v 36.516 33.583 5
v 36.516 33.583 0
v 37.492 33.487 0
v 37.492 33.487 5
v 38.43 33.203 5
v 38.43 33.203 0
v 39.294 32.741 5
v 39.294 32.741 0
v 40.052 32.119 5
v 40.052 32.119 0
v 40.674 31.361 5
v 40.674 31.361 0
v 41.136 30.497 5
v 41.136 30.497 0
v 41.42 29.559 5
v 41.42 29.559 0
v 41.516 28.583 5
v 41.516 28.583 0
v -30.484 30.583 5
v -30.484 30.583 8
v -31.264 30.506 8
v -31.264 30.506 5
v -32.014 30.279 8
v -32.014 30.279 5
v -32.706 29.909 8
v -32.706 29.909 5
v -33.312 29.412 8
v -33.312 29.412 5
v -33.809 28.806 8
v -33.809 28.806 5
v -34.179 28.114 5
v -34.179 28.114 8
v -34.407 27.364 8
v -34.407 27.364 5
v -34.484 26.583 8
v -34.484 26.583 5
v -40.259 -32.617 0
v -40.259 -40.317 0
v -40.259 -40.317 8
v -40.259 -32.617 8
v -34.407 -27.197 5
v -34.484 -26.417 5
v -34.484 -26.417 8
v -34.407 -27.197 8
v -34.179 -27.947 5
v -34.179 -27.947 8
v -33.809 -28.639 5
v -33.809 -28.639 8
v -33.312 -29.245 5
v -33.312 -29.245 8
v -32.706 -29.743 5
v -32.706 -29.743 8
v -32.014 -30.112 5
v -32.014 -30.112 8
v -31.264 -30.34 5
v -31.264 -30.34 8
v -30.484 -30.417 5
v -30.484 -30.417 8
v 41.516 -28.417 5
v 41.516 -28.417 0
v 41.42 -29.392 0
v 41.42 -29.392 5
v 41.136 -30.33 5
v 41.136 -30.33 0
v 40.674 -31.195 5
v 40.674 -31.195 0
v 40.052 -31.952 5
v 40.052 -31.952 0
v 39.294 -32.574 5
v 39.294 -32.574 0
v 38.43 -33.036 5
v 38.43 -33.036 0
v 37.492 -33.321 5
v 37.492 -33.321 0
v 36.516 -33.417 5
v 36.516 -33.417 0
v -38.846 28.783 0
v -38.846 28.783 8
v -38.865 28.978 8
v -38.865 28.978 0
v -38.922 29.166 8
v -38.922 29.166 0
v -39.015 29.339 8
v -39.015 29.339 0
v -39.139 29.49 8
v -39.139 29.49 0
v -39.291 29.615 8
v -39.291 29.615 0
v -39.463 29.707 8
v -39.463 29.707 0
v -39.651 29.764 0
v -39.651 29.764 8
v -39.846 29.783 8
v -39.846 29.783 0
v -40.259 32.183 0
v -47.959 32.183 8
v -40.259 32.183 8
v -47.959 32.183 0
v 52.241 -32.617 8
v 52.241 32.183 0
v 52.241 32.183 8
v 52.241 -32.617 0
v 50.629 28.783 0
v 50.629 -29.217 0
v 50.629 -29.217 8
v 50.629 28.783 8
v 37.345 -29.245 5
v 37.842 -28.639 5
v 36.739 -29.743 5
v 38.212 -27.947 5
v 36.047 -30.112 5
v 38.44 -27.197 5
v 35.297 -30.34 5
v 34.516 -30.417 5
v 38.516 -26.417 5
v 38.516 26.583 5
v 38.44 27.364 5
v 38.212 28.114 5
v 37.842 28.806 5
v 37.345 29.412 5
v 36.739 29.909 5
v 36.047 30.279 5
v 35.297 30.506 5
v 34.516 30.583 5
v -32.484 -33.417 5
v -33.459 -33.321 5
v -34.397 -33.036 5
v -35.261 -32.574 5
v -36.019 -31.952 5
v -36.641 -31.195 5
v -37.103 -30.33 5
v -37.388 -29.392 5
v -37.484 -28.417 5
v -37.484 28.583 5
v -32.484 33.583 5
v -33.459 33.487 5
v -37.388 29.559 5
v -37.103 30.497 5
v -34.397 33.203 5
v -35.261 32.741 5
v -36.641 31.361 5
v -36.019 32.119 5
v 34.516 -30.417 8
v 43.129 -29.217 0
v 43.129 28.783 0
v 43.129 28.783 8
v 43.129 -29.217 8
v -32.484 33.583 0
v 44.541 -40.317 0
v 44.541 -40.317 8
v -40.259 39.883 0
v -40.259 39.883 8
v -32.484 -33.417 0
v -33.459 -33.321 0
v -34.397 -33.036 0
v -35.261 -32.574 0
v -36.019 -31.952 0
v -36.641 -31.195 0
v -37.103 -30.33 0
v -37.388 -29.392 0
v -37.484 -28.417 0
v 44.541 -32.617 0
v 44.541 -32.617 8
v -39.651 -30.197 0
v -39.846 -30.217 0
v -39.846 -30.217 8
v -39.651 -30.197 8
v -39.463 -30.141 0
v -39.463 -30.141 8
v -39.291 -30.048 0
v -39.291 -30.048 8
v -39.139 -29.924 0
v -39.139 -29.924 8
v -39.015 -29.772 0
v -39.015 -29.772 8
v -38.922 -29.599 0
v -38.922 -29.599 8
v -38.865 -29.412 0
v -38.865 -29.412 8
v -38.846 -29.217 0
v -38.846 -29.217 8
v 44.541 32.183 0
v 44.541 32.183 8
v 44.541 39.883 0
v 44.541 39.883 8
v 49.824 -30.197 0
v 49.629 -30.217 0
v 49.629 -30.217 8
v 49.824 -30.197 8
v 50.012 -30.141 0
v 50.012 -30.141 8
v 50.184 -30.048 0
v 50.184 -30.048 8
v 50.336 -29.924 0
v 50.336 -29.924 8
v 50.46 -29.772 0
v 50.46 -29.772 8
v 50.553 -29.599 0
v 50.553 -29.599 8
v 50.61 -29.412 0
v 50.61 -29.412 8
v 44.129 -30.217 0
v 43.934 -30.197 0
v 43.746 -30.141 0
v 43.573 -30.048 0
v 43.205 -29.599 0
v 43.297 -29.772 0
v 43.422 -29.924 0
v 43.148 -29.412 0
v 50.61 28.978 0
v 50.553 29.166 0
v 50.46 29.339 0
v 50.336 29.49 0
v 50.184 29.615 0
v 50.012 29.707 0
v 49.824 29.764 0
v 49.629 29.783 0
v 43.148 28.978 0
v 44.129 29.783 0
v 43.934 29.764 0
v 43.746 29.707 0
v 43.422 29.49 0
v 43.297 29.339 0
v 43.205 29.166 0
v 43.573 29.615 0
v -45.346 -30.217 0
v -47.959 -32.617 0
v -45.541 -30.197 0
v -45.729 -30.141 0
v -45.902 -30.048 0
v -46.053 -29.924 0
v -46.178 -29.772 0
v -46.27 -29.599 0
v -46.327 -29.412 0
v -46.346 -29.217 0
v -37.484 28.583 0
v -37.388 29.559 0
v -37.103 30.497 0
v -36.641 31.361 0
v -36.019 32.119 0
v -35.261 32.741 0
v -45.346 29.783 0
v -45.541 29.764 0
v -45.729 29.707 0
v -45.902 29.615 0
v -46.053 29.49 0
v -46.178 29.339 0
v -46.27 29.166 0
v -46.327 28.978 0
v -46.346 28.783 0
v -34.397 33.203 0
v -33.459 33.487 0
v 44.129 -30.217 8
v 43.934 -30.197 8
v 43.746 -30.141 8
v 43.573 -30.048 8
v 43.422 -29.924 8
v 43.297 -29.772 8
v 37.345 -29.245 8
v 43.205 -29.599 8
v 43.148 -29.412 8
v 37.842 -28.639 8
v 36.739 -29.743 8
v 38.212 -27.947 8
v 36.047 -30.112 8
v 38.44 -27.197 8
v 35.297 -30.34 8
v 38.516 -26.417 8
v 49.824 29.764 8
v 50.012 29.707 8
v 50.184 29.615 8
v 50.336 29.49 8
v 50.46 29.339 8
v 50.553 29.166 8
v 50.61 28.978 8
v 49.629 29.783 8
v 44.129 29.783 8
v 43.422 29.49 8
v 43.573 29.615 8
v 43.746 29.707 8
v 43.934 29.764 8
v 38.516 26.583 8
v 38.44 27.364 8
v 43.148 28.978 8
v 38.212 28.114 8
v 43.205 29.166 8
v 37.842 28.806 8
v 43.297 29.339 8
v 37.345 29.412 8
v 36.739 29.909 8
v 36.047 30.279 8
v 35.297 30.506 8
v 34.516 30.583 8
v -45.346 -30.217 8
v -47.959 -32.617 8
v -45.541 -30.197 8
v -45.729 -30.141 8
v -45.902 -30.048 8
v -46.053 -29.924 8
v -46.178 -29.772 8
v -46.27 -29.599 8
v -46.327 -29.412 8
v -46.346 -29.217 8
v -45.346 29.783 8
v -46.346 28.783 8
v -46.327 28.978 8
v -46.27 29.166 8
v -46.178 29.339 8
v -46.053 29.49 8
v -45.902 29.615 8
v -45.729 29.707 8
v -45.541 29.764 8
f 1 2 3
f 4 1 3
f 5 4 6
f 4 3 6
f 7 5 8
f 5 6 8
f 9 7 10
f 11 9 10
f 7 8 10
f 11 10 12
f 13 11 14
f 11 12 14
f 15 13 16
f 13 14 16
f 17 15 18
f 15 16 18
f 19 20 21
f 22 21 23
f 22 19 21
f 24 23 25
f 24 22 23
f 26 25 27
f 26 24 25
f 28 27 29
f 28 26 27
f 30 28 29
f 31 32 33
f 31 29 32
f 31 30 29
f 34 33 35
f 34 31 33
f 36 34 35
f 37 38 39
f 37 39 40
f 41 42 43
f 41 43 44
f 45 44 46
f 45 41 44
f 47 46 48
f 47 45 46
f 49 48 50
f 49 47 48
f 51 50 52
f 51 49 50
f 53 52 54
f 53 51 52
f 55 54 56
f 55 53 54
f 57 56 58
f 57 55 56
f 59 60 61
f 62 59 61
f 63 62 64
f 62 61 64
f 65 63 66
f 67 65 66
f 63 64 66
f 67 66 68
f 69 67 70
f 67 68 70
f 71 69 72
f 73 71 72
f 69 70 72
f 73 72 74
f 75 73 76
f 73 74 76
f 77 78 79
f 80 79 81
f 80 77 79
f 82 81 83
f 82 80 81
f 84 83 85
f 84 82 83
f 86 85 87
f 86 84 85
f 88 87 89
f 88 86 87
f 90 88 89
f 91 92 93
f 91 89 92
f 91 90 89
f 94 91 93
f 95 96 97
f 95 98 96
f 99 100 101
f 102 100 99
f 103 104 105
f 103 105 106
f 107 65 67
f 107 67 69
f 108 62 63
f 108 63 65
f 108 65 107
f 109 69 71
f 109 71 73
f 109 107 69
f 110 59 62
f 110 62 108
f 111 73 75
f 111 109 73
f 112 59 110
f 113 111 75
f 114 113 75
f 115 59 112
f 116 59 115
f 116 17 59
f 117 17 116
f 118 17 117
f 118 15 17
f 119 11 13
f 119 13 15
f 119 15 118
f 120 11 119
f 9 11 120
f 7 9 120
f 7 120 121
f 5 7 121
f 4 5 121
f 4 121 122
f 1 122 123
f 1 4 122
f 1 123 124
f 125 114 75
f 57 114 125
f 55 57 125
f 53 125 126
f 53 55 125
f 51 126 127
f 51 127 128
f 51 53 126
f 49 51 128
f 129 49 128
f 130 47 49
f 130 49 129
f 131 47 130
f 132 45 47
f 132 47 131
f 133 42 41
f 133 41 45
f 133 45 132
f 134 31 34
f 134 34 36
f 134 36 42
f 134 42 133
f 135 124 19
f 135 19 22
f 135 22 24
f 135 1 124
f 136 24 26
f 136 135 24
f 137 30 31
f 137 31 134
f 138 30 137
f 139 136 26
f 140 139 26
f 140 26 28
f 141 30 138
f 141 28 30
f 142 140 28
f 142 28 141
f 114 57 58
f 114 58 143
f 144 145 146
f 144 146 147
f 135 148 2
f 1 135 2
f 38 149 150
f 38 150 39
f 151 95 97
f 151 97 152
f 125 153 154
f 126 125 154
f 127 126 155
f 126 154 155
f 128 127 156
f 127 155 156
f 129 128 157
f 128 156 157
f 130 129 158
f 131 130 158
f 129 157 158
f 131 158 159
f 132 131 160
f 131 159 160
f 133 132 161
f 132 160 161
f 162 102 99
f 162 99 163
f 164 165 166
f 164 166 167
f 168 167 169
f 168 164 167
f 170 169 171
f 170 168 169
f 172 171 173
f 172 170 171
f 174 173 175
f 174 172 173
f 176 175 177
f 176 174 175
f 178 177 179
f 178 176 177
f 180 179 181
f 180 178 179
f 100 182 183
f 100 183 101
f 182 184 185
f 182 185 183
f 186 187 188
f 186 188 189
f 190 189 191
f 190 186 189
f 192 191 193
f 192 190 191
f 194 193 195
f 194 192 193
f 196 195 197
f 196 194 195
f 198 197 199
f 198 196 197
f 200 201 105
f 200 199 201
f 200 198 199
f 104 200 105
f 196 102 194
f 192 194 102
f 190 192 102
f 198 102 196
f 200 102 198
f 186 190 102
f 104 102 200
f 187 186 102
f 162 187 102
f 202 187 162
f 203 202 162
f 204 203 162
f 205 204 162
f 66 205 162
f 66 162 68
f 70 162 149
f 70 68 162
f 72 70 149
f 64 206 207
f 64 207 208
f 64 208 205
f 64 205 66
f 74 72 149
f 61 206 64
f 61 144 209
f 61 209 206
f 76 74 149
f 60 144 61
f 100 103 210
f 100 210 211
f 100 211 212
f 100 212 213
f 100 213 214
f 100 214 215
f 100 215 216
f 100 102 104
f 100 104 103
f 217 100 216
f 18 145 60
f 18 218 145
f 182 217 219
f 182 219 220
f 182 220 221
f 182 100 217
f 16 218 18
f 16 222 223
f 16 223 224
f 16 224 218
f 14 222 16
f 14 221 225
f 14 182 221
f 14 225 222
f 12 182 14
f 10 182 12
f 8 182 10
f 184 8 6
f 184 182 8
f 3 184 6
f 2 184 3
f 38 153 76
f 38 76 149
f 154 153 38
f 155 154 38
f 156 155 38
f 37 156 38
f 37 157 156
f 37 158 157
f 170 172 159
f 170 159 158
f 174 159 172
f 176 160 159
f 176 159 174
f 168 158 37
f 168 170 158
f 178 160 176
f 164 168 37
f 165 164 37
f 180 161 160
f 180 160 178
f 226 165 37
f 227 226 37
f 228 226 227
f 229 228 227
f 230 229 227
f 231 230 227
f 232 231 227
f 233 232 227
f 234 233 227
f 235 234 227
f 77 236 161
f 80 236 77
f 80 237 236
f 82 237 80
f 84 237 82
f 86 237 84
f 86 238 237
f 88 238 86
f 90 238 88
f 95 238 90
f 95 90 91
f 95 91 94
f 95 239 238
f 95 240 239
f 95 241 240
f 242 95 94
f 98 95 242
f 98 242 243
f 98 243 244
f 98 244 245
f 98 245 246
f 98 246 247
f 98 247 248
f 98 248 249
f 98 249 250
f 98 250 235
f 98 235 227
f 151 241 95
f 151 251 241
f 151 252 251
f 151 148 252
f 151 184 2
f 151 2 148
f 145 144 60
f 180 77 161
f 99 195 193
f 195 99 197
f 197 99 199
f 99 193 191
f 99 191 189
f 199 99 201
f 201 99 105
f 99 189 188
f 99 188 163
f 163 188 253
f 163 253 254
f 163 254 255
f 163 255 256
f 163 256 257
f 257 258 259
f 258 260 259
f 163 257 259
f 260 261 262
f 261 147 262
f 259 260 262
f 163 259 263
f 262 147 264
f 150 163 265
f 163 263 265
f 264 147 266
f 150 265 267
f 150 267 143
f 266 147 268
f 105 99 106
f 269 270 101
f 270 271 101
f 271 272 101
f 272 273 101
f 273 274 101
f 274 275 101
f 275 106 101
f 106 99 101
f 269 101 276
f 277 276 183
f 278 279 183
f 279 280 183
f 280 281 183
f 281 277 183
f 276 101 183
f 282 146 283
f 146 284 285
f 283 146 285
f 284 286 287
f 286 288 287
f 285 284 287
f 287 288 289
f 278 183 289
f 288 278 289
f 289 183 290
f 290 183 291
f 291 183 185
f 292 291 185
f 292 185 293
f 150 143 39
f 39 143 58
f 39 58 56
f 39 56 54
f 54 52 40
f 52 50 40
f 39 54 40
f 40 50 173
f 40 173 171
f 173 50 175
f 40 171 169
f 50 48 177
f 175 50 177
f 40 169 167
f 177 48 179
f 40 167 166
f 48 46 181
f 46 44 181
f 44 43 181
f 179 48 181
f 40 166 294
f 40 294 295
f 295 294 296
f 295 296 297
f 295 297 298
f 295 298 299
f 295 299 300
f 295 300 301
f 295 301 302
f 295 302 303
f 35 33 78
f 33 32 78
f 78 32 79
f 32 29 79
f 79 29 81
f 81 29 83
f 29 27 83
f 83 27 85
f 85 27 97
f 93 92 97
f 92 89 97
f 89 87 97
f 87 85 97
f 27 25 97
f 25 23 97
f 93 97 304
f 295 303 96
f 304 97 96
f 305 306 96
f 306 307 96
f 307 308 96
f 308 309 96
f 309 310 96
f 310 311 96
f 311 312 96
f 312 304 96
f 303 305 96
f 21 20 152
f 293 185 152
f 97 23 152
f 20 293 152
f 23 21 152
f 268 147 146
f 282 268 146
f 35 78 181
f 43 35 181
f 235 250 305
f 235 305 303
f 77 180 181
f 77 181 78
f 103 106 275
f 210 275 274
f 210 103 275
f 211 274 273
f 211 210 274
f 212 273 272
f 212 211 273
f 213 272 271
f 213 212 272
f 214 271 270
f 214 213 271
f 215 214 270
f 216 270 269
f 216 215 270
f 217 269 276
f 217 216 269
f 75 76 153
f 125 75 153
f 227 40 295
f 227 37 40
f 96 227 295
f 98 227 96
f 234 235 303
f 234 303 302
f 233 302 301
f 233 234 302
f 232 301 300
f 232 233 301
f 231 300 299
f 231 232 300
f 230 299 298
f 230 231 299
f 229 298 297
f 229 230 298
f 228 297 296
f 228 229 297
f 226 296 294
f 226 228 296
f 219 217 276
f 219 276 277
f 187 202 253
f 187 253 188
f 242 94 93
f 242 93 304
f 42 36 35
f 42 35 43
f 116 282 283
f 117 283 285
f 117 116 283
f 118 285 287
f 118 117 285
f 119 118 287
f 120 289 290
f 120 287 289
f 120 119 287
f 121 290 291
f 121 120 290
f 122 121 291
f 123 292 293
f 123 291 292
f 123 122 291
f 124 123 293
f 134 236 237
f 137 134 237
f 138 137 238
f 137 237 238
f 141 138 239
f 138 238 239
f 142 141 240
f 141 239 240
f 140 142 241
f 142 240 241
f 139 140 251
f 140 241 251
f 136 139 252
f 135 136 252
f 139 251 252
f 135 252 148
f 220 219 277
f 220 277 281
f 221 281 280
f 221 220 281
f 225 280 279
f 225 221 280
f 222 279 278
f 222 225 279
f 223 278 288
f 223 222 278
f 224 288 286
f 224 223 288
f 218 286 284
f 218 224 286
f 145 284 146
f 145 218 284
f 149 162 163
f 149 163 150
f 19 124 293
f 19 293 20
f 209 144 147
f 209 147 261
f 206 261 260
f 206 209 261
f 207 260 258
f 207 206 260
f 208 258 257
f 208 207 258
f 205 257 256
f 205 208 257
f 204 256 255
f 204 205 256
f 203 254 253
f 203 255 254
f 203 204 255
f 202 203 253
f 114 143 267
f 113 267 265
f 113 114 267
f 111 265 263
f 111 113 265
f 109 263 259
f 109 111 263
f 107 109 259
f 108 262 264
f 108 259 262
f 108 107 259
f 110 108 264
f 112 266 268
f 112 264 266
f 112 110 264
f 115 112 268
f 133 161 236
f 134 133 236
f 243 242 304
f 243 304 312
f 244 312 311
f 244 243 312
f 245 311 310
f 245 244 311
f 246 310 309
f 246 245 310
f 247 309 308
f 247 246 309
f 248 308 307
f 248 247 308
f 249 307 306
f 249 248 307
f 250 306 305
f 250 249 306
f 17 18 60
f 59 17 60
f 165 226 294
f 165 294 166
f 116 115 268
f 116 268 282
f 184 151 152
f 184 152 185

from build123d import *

# Parameters (mm, degrees)
BOSS_EXTRU_1_DEPTH      = 5
BOSS_EXTRU_2_DEPTH      = 3
ENL_V_MAT_EXTRU_9_DEPTH = 10
ENL_V_MAT_EXTRU_4_DEPTH = 9


with BuildPart() as part:
    # Esquisse1 → Boss.-Extru.1 (new body)
    with BuildSketch(Plane.XY):
        Polygon((-40.258600608, 39.883341456), (44.541399392, 39.883341456), (44.541399392, 32.183341456), (52.241399392, 32.183341456), (52.241399392, -32.616658544), (44.541399392, -32.616658544), (44.541399392, -40.316658544), (-40.258600608, -40.316658544), (-40.258600608, -32.616658544), (-47.958600608, -32.616658544), (-47.958600608, 32.183341456), (-40.258600608, 32.183341456), align=None)
        with BuildLine():
            Line((-32.483600608, 33.583341456), (36.516399392, 33.583341456))
            ThreePointArc((36.516399392, 33.583341456), (40.051933298, 32.118875362), (41.516399392, 28.583341456))
            Line((41.516399392, 28.583341456), (41.516399392, -28.416658544))
            ThreePointArc((41.516399392, -28.416658544), (40.051933298, -31.952192449), (36.516399392, -33.416658544))
            Line((36.516399392, -33.416658544), (-32.483600608, -33.416658544))
            ThreePointArc((-32.483600608, -33.416658544), (-36.019134514, -31.952192449), (-37.483600608, -28.416658544))
            Line((-37.483600608, -28.416658544), (-37.483600608, 28.583341456))
            ThreePointArc((-37.483600608, 28.583341456), (-36.019134514, 32.118875362), (-32.483600608, 33.583341456))
        make_face(mode=Mode.SUBTRACT)
    extrude(amount=BOSS_EXTRU_1_DEPTH)

    # Esquisse2 → Boss.-Extru.2 (add)
    with BuildSketch(Plane.XY.offset(5)):
        Polygon((-47.958600608, 32.183341456), (-40.258600608, 32.183341456), (-40.258600608, 39.883341456), (44.541399392, 39.883341456), (44.541399392, 32.183341456), (52.241399392, 32.183341456), (52.241399392, -32.616658544), (44.541399392, -32.616658544), (44.541399392, -40.316658544), (-40.258600608, -40.316658544), (-40.258600608, -32.616658544), (-47.958600608, -32.616658544), align=None)
    extrude(amount=BOSS_EXTRU_2_DEPTH)

    # Esquisse8 → Enlèv. mat.-Extru.9 (cut)
    with BuildSketch(Plane(origin=(0, 0, 5), x_dir=(-1, 0, 0), z_dir=(0, 0, -1))):
        with BuildLine():
            Line((-34.516399392, 30.583341456), (30.483600608, 30.583341456))
            ThreePointArc((30.483600608, 30.583341456), (33.312027733, 29.411768581), (34.483600608, 26.583341456))
            Line((34.483600608, 26.583341456), (34.483600608, -26.416658544))
            ThreePointArc((34.483600608, -26.416658544), (33.312027733, -29.245085668), (30.483600608, -30.416658544))
            Line((30.483600608, -30.416658544), (-34.516399392, -30.416658544))
            ThreePointArc((-34.516399392, -30.416658544), (-37.344826516, -29.245085668), (-38.516399392, -26.416658544))
            Line((-38.516399392, -26.416658544), (-38.516399392, 26.583341456))
            ThreePointArc((-38.516399392, 26.583341456), (-37.344826516, 29.411768581), (-34.516399392, 30.583341456))
        make_face()
    extrude(amount=-ENL_V_MAT_EXTRU_9_DEPTH, mode=Mode.SUBTRACT)

    # Esquisse6 → Enlèv. mat.-Extru.4 (cut, through all)
    with BuildSketch(Plane(origin=(0, 0, 0), x_dir=(-1, 0, 0), z_dir=(0, 0, -1))):
        with BuildLine():
            Line((-49.628899392, 29.783341456), (-44.128899392, 29.783341456))
            ThreePointArc((-44.128899392, 29.783341456), (-43.421792611, 29.490448238), (-43.128899392, 28.783341456))
            Line((-43.128899392, 28.783341456), (-43.128899392, -29.216658544))
            ThreePointArc((-43.128899392, -29.216658544), (-43.421792611, -29.923765325), (-44.128899392, -30.216658544))
            Line((-44.128899392, -30.216658544), (-49.628899392, -30.216658544))
            ThreePointArc((-49.628899392, -30.216658544), (-50.336006173, -29.923765325), (-50.628899392, -29.216658544))
            Line((-50.628899392, -29.216658544), (-50.628899392, 28.783341456))
            ThreePointArc((-50.628899392, 28.783341456), (-50.336006173, 29.490448238), (-49.628899392, 29.783341456))
        make_face()
        with BuildLine():
            Line((45.346100608, -30.216658544), (39.846100608, -30.216658544))
            ThreePointArc((39.846100608, -30.216658544), (39.138993827, -29.923765325), (38.846100608, -29.216658544))
            Line((38.846100608, -29.216658544), (38.846100608, 28.783341456))
            ThreePointArc((38.846100608, 28.783341456), (39.138993827, 29.490448238), (39.846100608, 29.783341456))
            Line((39.846100608, 29.783341456), (45.346100608, 29.783341456))
            ThreePointArc((45.346100608, 29.783341456), (46.053207389, 29.490448238), (46.346100608, 28.783341456))
            Line((46.346100608, 28.783341456), (46.346100608, -29.216658544))
            ThreePointArc((46.346100608, -29.216658544), (46.053207389, -29.923765325), (45.346100608, -30.216658544))
        make_face()
    extrude(amount=-ENL_V_MAT_EXTRU_4_DEPTH, mode=Mode.SUBTRACT)


solid = part.part
